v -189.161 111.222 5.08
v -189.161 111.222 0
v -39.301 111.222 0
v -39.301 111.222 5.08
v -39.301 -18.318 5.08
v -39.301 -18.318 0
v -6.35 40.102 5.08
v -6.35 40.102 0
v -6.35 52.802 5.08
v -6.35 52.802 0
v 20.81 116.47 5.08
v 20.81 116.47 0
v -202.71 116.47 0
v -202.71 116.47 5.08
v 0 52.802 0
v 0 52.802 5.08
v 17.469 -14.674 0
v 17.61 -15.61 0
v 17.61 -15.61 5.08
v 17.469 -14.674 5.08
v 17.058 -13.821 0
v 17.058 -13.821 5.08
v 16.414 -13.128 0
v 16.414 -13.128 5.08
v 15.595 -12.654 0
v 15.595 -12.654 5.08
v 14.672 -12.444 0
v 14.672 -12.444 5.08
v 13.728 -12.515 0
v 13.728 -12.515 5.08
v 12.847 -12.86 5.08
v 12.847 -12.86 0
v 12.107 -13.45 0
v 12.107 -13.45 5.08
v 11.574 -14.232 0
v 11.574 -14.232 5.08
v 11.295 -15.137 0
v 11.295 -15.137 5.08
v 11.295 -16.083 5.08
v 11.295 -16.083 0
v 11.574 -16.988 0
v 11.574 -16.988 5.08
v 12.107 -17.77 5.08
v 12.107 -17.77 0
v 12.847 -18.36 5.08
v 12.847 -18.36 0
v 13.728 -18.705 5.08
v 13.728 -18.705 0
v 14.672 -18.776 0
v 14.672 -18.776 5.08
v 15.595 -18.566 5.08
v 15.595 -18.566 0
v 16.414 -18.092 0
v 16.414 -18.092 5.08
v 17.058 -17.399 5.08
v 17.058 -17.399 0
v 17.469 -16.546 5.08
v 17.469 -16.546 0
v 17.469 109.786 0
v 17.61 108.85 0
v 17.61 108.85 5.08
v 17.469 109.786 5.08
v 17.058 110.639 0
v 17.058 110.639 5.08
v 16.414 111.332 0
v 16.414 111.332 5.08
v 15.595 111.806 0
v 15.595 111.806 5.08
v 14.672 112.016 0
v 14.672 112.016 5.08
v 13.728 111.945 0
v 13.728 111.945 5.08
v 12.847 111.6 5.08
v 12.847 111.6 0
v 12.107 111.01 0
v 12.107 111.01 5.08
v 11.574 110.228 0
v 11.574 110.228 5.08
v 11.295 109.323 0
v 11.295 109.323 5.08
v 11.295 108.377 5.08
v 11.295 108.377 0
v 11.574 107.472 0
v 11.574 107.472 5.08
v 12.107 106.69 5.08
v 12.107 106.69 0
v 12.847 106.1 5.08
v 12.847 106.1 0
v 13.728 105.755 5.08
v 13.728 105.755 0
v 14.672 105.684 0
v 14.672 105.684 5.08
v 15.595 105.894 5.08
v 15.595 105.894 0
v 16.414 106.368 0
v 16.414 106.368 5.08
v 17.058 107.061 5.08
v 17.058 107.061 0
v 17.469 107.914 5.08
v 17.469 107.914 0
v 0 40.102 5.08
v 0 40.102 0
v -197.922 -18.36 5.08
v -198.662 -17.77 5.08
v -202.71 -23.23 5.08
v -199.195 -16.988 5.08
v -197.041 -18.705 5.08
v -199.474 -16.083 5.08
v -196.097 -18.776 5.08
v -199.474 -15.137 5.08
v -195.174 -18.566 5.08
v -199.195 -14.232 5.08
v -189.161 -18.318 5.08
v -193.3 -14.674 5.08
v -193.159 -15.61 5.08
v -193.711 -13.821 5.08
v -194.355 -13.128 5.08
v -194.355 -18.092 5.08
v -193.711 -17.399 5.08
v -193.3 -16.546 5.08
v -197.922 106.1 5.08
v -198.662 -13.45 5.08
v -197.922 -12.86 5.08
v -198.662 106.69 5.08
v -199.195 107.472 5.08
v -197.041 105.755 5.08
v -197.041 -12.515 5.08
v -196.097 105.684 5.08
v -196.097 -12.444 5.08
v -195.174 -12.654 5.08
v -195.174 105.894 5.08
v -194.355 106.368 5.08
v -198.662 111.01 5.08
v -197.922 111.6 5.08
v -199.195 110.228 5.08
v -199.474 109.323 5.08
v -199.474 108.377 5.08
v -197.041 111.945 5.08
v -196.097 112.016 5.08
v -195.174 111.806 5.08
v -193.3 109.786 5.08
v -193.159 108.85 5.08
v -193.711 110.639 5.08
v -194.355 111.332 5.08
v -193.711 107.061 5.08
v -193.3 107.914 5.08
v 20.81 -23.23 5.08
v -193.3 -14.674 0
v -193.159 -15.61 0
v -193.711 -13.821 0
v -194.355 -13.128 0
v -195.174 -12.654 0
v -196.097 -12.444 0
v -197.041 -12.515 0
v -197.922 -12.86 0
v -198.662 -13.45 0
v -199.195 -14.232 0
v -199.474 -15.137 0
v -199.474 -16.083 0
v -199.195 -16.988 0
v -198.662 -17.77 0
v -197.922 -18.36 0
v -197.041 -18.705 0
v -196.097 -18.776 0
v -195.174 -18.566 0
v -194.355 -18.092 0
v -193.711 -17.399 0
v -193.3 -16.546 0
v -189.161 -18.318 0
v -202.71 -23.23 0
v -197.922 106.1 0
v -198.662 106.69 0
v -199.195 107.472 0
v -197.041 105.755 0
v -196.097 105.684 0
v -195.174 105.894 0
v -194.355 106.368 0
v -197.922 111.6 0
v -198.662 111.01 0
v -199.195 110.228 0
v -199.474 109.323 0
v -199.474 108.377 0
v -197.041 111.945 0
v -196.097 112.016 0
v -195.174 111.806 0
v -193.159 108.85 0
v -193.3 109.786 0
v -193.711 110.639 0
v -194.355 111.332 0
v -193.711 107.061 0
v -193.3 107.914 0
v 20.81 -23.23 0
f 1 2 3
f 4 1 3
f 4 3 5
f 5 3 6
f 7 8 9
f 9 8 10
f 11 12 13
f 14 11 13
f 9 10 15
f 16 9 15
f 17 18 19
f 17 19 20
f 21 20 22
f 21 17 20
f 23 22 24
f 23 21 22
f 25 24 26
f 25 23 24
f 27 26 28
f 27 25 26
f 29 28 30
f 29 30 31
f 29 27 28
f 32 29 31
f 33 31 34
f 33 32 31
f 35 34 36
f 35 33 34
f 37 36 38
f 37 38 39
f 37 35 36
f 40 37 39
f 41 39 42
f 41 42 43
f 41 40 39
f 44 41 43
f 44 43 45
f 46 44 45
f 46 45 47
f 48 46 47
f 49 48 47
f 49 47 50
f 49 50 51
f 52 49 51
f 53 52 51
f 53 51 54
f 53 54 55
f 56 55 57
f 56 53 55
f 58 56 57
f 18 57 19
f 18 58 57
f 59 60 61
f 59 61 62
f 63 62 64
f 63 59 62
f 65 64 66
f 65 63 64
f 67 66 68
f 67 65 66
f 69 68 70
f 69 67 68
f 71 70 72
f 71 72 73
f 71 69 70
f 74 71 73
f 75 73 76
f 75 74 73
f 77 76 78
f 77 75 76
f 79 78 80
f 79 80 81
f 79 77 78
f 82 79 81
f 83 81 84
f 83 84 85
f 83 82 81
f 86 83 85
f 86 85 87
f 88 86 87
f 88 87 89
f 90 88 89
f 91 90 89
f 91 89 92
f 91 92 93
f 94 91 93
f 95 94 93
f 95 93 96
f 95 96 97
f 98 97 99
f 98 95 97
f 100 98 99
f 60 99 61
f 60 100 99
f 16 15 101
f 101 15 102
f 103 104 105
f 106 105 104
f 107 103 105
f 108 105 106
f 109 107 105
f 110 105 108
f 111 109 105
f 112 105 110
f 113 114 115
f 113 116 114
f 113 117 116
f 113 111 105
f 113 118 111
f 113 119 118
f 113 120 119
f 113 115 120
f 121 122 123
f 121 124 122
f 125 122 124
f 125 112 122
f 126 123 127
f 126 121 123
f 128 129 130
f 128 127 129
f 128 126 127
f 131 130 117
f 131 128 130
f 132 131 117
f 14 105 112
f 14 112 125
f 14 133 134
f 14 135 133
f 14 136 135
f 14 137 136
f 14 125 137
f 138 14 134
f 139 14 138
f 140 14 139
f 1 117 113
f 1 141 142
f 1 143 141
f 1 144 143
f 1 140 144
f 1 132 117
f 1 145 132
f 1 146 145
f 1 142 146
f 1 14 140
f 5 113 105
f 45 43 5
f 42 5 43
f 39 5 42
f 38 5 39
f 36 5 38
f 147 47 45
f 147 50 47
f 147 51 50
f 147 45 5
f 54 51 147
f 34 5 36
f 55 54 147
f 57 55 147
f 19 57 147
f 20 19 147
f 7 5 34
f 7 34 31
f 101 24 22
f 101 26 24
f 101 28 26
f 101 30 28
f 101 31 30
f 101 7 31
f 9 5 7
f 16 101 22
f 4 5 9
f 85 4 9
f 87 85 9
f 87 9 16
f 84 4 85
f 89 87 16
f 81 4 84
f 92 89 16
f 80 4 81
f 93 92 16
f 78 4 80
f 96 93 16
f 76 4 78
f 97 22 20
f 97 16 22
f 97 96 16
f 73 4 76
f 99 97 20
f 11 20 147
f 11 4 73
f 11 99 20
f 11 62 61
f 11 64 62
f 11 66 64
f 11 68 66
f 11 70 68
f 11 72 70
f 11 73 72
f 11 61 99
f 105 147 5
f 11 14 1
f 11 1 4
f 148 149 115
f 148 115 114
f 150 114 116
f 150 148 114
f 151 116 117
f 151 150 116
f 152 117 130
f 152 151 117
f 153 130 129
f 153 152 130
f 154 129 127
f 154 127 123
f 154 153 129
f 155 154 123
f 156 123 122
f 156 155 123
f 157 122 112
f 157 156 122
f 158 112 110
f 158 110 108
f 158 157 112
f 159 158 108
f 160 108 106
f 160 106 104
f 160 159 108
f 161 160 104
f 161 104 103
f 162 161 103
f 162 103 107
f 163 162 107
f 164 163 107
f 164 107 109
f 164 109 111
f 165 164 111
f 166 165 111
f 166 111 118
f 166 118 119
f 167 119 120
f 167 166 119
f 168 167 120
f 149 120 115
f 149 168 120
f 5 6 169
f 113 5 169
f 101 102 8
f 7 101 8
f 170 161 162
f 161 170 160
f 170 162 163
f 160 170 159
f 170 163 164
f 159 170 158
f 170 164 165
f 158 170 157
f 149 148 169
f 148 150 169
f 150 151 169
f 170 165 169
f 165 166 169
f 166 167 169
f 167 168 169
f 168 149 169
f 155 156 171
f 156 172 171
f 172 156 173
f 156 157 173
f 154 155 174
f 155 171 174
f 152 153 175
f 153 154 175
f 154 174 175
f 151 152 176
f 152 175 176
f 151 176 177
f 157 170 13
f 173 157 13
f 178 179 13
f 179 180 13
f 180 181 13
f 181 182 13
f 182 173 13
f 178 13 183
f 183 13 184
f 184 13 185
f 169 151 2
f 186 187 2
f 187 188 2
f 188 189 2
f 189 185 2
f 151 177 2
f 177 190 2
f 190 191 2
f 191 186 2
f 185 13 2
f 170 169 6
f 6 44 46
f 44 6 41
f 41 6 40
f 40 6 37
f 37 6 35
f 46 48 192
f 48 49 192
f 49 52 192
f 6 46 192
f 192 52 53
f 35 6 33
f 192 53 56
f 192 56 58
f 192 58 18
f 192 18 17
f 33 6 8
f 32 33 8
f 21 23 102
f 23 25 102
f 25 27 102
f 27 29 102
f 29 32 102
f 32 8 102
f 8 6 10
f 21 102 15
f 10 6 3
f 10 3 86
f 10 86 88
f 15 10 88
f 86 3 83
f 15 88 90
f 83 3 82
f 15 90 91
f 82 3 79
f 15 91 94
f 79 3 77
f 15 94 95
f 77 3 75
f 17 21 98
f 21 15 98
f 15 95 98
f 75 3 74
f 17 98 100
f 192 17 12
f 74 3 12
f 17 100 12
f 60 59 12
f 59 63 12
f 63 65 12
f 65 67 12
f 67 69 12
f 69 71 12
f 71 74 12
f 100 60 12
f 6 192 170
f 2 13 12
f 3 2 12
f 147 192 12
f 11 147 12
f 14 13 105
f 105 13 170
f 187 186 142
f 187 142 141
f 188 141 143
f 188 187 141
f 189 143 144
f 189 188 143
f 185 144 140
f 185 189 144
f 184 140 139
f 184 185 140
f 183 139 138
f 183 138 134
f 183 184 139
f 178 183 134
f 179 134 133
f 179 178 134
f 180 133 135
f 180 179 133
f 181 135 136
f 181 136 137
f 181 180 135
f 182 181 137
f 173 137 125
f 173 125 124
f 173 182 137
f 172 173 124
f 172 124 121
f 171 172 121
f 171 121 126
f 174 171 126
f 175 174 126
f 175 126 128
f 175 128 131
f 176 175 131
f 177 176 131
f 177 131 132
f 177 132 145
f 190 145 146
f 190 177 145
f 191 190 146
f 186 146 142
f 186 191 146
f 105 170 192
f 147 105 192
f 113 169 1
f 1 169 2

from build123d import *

# Parameters (mm, degrees)
F0_R     = 3.175
F1_DEPTH = 5.08


# Not quite as in the source:
# - a feature names something its author has since deleted; it is built from what else it names


with BuildPart() as f1:
    # F0 (on Top) → F1 (new body)
    with BuildSketch(Plane.XY):
        Polygon((-196.7800016522, 116.4700038791), (-196.7814051471, 116.4700038791), (-202.7097940445, 116.4700038791), (-202.7097940445, 108.8500038791), (-202.7097940445, 101.2300038791), (-202.7097940445, -23.2299961209), (-196.7800016522, -23.2299961209), (20.8102059555, -23.2299961209), (20.8102059555, 116.4700038791), (15.3085948529, 116.4700038791), (-35.4914051471, 116.4700038791), (-39.3014051471, 116.4700038791), (-90.9497940445, 116.4700038791), (-187.4697940445, 116.4700038791), (-189.1614051471, 116.4700038791), (-195.0897940445, 116.4700038791), align=None)
        with Locations((-196.3344303894, -15.6099961209)):
            Circle(F0_R, mode=Mode.SUBTRACT)
        Polygon((-189.1614051471, -18.3182691255), (-189.1614051471, 111.2217308745), (-189.1583133745, 111.2217308745), (-39.3014051471, 111.2217308745), (-39.3014051471, -18.3182691255), align=None, mode=Mode.SUBTRACT)
        with Locations((14.4348423004, -15.6099961209)):
            Circle(F0_R, mode=Mode.SUBTRACT)
        Polygon((0, 52.8017308745), (0, 46.4517308745), (0, 40.1017308745), (-6.35, 40.1017308745), (-6.35, 46.4517308745), (-6.35, 52.8017308745), align=None, mode=Mode.SUBTRACT)
        with Locations((-196.3344303894, 108.8500038791)):
            Circle(F0_R, mode=Mode.SUBTRACT)
        with Locations((14.4348423004, 108.8500038791)):
            Circle(F0_R, mode=Mode.SUBTRACT)
    extrude(amount=F1_DEPTH)


solid = f1.part
